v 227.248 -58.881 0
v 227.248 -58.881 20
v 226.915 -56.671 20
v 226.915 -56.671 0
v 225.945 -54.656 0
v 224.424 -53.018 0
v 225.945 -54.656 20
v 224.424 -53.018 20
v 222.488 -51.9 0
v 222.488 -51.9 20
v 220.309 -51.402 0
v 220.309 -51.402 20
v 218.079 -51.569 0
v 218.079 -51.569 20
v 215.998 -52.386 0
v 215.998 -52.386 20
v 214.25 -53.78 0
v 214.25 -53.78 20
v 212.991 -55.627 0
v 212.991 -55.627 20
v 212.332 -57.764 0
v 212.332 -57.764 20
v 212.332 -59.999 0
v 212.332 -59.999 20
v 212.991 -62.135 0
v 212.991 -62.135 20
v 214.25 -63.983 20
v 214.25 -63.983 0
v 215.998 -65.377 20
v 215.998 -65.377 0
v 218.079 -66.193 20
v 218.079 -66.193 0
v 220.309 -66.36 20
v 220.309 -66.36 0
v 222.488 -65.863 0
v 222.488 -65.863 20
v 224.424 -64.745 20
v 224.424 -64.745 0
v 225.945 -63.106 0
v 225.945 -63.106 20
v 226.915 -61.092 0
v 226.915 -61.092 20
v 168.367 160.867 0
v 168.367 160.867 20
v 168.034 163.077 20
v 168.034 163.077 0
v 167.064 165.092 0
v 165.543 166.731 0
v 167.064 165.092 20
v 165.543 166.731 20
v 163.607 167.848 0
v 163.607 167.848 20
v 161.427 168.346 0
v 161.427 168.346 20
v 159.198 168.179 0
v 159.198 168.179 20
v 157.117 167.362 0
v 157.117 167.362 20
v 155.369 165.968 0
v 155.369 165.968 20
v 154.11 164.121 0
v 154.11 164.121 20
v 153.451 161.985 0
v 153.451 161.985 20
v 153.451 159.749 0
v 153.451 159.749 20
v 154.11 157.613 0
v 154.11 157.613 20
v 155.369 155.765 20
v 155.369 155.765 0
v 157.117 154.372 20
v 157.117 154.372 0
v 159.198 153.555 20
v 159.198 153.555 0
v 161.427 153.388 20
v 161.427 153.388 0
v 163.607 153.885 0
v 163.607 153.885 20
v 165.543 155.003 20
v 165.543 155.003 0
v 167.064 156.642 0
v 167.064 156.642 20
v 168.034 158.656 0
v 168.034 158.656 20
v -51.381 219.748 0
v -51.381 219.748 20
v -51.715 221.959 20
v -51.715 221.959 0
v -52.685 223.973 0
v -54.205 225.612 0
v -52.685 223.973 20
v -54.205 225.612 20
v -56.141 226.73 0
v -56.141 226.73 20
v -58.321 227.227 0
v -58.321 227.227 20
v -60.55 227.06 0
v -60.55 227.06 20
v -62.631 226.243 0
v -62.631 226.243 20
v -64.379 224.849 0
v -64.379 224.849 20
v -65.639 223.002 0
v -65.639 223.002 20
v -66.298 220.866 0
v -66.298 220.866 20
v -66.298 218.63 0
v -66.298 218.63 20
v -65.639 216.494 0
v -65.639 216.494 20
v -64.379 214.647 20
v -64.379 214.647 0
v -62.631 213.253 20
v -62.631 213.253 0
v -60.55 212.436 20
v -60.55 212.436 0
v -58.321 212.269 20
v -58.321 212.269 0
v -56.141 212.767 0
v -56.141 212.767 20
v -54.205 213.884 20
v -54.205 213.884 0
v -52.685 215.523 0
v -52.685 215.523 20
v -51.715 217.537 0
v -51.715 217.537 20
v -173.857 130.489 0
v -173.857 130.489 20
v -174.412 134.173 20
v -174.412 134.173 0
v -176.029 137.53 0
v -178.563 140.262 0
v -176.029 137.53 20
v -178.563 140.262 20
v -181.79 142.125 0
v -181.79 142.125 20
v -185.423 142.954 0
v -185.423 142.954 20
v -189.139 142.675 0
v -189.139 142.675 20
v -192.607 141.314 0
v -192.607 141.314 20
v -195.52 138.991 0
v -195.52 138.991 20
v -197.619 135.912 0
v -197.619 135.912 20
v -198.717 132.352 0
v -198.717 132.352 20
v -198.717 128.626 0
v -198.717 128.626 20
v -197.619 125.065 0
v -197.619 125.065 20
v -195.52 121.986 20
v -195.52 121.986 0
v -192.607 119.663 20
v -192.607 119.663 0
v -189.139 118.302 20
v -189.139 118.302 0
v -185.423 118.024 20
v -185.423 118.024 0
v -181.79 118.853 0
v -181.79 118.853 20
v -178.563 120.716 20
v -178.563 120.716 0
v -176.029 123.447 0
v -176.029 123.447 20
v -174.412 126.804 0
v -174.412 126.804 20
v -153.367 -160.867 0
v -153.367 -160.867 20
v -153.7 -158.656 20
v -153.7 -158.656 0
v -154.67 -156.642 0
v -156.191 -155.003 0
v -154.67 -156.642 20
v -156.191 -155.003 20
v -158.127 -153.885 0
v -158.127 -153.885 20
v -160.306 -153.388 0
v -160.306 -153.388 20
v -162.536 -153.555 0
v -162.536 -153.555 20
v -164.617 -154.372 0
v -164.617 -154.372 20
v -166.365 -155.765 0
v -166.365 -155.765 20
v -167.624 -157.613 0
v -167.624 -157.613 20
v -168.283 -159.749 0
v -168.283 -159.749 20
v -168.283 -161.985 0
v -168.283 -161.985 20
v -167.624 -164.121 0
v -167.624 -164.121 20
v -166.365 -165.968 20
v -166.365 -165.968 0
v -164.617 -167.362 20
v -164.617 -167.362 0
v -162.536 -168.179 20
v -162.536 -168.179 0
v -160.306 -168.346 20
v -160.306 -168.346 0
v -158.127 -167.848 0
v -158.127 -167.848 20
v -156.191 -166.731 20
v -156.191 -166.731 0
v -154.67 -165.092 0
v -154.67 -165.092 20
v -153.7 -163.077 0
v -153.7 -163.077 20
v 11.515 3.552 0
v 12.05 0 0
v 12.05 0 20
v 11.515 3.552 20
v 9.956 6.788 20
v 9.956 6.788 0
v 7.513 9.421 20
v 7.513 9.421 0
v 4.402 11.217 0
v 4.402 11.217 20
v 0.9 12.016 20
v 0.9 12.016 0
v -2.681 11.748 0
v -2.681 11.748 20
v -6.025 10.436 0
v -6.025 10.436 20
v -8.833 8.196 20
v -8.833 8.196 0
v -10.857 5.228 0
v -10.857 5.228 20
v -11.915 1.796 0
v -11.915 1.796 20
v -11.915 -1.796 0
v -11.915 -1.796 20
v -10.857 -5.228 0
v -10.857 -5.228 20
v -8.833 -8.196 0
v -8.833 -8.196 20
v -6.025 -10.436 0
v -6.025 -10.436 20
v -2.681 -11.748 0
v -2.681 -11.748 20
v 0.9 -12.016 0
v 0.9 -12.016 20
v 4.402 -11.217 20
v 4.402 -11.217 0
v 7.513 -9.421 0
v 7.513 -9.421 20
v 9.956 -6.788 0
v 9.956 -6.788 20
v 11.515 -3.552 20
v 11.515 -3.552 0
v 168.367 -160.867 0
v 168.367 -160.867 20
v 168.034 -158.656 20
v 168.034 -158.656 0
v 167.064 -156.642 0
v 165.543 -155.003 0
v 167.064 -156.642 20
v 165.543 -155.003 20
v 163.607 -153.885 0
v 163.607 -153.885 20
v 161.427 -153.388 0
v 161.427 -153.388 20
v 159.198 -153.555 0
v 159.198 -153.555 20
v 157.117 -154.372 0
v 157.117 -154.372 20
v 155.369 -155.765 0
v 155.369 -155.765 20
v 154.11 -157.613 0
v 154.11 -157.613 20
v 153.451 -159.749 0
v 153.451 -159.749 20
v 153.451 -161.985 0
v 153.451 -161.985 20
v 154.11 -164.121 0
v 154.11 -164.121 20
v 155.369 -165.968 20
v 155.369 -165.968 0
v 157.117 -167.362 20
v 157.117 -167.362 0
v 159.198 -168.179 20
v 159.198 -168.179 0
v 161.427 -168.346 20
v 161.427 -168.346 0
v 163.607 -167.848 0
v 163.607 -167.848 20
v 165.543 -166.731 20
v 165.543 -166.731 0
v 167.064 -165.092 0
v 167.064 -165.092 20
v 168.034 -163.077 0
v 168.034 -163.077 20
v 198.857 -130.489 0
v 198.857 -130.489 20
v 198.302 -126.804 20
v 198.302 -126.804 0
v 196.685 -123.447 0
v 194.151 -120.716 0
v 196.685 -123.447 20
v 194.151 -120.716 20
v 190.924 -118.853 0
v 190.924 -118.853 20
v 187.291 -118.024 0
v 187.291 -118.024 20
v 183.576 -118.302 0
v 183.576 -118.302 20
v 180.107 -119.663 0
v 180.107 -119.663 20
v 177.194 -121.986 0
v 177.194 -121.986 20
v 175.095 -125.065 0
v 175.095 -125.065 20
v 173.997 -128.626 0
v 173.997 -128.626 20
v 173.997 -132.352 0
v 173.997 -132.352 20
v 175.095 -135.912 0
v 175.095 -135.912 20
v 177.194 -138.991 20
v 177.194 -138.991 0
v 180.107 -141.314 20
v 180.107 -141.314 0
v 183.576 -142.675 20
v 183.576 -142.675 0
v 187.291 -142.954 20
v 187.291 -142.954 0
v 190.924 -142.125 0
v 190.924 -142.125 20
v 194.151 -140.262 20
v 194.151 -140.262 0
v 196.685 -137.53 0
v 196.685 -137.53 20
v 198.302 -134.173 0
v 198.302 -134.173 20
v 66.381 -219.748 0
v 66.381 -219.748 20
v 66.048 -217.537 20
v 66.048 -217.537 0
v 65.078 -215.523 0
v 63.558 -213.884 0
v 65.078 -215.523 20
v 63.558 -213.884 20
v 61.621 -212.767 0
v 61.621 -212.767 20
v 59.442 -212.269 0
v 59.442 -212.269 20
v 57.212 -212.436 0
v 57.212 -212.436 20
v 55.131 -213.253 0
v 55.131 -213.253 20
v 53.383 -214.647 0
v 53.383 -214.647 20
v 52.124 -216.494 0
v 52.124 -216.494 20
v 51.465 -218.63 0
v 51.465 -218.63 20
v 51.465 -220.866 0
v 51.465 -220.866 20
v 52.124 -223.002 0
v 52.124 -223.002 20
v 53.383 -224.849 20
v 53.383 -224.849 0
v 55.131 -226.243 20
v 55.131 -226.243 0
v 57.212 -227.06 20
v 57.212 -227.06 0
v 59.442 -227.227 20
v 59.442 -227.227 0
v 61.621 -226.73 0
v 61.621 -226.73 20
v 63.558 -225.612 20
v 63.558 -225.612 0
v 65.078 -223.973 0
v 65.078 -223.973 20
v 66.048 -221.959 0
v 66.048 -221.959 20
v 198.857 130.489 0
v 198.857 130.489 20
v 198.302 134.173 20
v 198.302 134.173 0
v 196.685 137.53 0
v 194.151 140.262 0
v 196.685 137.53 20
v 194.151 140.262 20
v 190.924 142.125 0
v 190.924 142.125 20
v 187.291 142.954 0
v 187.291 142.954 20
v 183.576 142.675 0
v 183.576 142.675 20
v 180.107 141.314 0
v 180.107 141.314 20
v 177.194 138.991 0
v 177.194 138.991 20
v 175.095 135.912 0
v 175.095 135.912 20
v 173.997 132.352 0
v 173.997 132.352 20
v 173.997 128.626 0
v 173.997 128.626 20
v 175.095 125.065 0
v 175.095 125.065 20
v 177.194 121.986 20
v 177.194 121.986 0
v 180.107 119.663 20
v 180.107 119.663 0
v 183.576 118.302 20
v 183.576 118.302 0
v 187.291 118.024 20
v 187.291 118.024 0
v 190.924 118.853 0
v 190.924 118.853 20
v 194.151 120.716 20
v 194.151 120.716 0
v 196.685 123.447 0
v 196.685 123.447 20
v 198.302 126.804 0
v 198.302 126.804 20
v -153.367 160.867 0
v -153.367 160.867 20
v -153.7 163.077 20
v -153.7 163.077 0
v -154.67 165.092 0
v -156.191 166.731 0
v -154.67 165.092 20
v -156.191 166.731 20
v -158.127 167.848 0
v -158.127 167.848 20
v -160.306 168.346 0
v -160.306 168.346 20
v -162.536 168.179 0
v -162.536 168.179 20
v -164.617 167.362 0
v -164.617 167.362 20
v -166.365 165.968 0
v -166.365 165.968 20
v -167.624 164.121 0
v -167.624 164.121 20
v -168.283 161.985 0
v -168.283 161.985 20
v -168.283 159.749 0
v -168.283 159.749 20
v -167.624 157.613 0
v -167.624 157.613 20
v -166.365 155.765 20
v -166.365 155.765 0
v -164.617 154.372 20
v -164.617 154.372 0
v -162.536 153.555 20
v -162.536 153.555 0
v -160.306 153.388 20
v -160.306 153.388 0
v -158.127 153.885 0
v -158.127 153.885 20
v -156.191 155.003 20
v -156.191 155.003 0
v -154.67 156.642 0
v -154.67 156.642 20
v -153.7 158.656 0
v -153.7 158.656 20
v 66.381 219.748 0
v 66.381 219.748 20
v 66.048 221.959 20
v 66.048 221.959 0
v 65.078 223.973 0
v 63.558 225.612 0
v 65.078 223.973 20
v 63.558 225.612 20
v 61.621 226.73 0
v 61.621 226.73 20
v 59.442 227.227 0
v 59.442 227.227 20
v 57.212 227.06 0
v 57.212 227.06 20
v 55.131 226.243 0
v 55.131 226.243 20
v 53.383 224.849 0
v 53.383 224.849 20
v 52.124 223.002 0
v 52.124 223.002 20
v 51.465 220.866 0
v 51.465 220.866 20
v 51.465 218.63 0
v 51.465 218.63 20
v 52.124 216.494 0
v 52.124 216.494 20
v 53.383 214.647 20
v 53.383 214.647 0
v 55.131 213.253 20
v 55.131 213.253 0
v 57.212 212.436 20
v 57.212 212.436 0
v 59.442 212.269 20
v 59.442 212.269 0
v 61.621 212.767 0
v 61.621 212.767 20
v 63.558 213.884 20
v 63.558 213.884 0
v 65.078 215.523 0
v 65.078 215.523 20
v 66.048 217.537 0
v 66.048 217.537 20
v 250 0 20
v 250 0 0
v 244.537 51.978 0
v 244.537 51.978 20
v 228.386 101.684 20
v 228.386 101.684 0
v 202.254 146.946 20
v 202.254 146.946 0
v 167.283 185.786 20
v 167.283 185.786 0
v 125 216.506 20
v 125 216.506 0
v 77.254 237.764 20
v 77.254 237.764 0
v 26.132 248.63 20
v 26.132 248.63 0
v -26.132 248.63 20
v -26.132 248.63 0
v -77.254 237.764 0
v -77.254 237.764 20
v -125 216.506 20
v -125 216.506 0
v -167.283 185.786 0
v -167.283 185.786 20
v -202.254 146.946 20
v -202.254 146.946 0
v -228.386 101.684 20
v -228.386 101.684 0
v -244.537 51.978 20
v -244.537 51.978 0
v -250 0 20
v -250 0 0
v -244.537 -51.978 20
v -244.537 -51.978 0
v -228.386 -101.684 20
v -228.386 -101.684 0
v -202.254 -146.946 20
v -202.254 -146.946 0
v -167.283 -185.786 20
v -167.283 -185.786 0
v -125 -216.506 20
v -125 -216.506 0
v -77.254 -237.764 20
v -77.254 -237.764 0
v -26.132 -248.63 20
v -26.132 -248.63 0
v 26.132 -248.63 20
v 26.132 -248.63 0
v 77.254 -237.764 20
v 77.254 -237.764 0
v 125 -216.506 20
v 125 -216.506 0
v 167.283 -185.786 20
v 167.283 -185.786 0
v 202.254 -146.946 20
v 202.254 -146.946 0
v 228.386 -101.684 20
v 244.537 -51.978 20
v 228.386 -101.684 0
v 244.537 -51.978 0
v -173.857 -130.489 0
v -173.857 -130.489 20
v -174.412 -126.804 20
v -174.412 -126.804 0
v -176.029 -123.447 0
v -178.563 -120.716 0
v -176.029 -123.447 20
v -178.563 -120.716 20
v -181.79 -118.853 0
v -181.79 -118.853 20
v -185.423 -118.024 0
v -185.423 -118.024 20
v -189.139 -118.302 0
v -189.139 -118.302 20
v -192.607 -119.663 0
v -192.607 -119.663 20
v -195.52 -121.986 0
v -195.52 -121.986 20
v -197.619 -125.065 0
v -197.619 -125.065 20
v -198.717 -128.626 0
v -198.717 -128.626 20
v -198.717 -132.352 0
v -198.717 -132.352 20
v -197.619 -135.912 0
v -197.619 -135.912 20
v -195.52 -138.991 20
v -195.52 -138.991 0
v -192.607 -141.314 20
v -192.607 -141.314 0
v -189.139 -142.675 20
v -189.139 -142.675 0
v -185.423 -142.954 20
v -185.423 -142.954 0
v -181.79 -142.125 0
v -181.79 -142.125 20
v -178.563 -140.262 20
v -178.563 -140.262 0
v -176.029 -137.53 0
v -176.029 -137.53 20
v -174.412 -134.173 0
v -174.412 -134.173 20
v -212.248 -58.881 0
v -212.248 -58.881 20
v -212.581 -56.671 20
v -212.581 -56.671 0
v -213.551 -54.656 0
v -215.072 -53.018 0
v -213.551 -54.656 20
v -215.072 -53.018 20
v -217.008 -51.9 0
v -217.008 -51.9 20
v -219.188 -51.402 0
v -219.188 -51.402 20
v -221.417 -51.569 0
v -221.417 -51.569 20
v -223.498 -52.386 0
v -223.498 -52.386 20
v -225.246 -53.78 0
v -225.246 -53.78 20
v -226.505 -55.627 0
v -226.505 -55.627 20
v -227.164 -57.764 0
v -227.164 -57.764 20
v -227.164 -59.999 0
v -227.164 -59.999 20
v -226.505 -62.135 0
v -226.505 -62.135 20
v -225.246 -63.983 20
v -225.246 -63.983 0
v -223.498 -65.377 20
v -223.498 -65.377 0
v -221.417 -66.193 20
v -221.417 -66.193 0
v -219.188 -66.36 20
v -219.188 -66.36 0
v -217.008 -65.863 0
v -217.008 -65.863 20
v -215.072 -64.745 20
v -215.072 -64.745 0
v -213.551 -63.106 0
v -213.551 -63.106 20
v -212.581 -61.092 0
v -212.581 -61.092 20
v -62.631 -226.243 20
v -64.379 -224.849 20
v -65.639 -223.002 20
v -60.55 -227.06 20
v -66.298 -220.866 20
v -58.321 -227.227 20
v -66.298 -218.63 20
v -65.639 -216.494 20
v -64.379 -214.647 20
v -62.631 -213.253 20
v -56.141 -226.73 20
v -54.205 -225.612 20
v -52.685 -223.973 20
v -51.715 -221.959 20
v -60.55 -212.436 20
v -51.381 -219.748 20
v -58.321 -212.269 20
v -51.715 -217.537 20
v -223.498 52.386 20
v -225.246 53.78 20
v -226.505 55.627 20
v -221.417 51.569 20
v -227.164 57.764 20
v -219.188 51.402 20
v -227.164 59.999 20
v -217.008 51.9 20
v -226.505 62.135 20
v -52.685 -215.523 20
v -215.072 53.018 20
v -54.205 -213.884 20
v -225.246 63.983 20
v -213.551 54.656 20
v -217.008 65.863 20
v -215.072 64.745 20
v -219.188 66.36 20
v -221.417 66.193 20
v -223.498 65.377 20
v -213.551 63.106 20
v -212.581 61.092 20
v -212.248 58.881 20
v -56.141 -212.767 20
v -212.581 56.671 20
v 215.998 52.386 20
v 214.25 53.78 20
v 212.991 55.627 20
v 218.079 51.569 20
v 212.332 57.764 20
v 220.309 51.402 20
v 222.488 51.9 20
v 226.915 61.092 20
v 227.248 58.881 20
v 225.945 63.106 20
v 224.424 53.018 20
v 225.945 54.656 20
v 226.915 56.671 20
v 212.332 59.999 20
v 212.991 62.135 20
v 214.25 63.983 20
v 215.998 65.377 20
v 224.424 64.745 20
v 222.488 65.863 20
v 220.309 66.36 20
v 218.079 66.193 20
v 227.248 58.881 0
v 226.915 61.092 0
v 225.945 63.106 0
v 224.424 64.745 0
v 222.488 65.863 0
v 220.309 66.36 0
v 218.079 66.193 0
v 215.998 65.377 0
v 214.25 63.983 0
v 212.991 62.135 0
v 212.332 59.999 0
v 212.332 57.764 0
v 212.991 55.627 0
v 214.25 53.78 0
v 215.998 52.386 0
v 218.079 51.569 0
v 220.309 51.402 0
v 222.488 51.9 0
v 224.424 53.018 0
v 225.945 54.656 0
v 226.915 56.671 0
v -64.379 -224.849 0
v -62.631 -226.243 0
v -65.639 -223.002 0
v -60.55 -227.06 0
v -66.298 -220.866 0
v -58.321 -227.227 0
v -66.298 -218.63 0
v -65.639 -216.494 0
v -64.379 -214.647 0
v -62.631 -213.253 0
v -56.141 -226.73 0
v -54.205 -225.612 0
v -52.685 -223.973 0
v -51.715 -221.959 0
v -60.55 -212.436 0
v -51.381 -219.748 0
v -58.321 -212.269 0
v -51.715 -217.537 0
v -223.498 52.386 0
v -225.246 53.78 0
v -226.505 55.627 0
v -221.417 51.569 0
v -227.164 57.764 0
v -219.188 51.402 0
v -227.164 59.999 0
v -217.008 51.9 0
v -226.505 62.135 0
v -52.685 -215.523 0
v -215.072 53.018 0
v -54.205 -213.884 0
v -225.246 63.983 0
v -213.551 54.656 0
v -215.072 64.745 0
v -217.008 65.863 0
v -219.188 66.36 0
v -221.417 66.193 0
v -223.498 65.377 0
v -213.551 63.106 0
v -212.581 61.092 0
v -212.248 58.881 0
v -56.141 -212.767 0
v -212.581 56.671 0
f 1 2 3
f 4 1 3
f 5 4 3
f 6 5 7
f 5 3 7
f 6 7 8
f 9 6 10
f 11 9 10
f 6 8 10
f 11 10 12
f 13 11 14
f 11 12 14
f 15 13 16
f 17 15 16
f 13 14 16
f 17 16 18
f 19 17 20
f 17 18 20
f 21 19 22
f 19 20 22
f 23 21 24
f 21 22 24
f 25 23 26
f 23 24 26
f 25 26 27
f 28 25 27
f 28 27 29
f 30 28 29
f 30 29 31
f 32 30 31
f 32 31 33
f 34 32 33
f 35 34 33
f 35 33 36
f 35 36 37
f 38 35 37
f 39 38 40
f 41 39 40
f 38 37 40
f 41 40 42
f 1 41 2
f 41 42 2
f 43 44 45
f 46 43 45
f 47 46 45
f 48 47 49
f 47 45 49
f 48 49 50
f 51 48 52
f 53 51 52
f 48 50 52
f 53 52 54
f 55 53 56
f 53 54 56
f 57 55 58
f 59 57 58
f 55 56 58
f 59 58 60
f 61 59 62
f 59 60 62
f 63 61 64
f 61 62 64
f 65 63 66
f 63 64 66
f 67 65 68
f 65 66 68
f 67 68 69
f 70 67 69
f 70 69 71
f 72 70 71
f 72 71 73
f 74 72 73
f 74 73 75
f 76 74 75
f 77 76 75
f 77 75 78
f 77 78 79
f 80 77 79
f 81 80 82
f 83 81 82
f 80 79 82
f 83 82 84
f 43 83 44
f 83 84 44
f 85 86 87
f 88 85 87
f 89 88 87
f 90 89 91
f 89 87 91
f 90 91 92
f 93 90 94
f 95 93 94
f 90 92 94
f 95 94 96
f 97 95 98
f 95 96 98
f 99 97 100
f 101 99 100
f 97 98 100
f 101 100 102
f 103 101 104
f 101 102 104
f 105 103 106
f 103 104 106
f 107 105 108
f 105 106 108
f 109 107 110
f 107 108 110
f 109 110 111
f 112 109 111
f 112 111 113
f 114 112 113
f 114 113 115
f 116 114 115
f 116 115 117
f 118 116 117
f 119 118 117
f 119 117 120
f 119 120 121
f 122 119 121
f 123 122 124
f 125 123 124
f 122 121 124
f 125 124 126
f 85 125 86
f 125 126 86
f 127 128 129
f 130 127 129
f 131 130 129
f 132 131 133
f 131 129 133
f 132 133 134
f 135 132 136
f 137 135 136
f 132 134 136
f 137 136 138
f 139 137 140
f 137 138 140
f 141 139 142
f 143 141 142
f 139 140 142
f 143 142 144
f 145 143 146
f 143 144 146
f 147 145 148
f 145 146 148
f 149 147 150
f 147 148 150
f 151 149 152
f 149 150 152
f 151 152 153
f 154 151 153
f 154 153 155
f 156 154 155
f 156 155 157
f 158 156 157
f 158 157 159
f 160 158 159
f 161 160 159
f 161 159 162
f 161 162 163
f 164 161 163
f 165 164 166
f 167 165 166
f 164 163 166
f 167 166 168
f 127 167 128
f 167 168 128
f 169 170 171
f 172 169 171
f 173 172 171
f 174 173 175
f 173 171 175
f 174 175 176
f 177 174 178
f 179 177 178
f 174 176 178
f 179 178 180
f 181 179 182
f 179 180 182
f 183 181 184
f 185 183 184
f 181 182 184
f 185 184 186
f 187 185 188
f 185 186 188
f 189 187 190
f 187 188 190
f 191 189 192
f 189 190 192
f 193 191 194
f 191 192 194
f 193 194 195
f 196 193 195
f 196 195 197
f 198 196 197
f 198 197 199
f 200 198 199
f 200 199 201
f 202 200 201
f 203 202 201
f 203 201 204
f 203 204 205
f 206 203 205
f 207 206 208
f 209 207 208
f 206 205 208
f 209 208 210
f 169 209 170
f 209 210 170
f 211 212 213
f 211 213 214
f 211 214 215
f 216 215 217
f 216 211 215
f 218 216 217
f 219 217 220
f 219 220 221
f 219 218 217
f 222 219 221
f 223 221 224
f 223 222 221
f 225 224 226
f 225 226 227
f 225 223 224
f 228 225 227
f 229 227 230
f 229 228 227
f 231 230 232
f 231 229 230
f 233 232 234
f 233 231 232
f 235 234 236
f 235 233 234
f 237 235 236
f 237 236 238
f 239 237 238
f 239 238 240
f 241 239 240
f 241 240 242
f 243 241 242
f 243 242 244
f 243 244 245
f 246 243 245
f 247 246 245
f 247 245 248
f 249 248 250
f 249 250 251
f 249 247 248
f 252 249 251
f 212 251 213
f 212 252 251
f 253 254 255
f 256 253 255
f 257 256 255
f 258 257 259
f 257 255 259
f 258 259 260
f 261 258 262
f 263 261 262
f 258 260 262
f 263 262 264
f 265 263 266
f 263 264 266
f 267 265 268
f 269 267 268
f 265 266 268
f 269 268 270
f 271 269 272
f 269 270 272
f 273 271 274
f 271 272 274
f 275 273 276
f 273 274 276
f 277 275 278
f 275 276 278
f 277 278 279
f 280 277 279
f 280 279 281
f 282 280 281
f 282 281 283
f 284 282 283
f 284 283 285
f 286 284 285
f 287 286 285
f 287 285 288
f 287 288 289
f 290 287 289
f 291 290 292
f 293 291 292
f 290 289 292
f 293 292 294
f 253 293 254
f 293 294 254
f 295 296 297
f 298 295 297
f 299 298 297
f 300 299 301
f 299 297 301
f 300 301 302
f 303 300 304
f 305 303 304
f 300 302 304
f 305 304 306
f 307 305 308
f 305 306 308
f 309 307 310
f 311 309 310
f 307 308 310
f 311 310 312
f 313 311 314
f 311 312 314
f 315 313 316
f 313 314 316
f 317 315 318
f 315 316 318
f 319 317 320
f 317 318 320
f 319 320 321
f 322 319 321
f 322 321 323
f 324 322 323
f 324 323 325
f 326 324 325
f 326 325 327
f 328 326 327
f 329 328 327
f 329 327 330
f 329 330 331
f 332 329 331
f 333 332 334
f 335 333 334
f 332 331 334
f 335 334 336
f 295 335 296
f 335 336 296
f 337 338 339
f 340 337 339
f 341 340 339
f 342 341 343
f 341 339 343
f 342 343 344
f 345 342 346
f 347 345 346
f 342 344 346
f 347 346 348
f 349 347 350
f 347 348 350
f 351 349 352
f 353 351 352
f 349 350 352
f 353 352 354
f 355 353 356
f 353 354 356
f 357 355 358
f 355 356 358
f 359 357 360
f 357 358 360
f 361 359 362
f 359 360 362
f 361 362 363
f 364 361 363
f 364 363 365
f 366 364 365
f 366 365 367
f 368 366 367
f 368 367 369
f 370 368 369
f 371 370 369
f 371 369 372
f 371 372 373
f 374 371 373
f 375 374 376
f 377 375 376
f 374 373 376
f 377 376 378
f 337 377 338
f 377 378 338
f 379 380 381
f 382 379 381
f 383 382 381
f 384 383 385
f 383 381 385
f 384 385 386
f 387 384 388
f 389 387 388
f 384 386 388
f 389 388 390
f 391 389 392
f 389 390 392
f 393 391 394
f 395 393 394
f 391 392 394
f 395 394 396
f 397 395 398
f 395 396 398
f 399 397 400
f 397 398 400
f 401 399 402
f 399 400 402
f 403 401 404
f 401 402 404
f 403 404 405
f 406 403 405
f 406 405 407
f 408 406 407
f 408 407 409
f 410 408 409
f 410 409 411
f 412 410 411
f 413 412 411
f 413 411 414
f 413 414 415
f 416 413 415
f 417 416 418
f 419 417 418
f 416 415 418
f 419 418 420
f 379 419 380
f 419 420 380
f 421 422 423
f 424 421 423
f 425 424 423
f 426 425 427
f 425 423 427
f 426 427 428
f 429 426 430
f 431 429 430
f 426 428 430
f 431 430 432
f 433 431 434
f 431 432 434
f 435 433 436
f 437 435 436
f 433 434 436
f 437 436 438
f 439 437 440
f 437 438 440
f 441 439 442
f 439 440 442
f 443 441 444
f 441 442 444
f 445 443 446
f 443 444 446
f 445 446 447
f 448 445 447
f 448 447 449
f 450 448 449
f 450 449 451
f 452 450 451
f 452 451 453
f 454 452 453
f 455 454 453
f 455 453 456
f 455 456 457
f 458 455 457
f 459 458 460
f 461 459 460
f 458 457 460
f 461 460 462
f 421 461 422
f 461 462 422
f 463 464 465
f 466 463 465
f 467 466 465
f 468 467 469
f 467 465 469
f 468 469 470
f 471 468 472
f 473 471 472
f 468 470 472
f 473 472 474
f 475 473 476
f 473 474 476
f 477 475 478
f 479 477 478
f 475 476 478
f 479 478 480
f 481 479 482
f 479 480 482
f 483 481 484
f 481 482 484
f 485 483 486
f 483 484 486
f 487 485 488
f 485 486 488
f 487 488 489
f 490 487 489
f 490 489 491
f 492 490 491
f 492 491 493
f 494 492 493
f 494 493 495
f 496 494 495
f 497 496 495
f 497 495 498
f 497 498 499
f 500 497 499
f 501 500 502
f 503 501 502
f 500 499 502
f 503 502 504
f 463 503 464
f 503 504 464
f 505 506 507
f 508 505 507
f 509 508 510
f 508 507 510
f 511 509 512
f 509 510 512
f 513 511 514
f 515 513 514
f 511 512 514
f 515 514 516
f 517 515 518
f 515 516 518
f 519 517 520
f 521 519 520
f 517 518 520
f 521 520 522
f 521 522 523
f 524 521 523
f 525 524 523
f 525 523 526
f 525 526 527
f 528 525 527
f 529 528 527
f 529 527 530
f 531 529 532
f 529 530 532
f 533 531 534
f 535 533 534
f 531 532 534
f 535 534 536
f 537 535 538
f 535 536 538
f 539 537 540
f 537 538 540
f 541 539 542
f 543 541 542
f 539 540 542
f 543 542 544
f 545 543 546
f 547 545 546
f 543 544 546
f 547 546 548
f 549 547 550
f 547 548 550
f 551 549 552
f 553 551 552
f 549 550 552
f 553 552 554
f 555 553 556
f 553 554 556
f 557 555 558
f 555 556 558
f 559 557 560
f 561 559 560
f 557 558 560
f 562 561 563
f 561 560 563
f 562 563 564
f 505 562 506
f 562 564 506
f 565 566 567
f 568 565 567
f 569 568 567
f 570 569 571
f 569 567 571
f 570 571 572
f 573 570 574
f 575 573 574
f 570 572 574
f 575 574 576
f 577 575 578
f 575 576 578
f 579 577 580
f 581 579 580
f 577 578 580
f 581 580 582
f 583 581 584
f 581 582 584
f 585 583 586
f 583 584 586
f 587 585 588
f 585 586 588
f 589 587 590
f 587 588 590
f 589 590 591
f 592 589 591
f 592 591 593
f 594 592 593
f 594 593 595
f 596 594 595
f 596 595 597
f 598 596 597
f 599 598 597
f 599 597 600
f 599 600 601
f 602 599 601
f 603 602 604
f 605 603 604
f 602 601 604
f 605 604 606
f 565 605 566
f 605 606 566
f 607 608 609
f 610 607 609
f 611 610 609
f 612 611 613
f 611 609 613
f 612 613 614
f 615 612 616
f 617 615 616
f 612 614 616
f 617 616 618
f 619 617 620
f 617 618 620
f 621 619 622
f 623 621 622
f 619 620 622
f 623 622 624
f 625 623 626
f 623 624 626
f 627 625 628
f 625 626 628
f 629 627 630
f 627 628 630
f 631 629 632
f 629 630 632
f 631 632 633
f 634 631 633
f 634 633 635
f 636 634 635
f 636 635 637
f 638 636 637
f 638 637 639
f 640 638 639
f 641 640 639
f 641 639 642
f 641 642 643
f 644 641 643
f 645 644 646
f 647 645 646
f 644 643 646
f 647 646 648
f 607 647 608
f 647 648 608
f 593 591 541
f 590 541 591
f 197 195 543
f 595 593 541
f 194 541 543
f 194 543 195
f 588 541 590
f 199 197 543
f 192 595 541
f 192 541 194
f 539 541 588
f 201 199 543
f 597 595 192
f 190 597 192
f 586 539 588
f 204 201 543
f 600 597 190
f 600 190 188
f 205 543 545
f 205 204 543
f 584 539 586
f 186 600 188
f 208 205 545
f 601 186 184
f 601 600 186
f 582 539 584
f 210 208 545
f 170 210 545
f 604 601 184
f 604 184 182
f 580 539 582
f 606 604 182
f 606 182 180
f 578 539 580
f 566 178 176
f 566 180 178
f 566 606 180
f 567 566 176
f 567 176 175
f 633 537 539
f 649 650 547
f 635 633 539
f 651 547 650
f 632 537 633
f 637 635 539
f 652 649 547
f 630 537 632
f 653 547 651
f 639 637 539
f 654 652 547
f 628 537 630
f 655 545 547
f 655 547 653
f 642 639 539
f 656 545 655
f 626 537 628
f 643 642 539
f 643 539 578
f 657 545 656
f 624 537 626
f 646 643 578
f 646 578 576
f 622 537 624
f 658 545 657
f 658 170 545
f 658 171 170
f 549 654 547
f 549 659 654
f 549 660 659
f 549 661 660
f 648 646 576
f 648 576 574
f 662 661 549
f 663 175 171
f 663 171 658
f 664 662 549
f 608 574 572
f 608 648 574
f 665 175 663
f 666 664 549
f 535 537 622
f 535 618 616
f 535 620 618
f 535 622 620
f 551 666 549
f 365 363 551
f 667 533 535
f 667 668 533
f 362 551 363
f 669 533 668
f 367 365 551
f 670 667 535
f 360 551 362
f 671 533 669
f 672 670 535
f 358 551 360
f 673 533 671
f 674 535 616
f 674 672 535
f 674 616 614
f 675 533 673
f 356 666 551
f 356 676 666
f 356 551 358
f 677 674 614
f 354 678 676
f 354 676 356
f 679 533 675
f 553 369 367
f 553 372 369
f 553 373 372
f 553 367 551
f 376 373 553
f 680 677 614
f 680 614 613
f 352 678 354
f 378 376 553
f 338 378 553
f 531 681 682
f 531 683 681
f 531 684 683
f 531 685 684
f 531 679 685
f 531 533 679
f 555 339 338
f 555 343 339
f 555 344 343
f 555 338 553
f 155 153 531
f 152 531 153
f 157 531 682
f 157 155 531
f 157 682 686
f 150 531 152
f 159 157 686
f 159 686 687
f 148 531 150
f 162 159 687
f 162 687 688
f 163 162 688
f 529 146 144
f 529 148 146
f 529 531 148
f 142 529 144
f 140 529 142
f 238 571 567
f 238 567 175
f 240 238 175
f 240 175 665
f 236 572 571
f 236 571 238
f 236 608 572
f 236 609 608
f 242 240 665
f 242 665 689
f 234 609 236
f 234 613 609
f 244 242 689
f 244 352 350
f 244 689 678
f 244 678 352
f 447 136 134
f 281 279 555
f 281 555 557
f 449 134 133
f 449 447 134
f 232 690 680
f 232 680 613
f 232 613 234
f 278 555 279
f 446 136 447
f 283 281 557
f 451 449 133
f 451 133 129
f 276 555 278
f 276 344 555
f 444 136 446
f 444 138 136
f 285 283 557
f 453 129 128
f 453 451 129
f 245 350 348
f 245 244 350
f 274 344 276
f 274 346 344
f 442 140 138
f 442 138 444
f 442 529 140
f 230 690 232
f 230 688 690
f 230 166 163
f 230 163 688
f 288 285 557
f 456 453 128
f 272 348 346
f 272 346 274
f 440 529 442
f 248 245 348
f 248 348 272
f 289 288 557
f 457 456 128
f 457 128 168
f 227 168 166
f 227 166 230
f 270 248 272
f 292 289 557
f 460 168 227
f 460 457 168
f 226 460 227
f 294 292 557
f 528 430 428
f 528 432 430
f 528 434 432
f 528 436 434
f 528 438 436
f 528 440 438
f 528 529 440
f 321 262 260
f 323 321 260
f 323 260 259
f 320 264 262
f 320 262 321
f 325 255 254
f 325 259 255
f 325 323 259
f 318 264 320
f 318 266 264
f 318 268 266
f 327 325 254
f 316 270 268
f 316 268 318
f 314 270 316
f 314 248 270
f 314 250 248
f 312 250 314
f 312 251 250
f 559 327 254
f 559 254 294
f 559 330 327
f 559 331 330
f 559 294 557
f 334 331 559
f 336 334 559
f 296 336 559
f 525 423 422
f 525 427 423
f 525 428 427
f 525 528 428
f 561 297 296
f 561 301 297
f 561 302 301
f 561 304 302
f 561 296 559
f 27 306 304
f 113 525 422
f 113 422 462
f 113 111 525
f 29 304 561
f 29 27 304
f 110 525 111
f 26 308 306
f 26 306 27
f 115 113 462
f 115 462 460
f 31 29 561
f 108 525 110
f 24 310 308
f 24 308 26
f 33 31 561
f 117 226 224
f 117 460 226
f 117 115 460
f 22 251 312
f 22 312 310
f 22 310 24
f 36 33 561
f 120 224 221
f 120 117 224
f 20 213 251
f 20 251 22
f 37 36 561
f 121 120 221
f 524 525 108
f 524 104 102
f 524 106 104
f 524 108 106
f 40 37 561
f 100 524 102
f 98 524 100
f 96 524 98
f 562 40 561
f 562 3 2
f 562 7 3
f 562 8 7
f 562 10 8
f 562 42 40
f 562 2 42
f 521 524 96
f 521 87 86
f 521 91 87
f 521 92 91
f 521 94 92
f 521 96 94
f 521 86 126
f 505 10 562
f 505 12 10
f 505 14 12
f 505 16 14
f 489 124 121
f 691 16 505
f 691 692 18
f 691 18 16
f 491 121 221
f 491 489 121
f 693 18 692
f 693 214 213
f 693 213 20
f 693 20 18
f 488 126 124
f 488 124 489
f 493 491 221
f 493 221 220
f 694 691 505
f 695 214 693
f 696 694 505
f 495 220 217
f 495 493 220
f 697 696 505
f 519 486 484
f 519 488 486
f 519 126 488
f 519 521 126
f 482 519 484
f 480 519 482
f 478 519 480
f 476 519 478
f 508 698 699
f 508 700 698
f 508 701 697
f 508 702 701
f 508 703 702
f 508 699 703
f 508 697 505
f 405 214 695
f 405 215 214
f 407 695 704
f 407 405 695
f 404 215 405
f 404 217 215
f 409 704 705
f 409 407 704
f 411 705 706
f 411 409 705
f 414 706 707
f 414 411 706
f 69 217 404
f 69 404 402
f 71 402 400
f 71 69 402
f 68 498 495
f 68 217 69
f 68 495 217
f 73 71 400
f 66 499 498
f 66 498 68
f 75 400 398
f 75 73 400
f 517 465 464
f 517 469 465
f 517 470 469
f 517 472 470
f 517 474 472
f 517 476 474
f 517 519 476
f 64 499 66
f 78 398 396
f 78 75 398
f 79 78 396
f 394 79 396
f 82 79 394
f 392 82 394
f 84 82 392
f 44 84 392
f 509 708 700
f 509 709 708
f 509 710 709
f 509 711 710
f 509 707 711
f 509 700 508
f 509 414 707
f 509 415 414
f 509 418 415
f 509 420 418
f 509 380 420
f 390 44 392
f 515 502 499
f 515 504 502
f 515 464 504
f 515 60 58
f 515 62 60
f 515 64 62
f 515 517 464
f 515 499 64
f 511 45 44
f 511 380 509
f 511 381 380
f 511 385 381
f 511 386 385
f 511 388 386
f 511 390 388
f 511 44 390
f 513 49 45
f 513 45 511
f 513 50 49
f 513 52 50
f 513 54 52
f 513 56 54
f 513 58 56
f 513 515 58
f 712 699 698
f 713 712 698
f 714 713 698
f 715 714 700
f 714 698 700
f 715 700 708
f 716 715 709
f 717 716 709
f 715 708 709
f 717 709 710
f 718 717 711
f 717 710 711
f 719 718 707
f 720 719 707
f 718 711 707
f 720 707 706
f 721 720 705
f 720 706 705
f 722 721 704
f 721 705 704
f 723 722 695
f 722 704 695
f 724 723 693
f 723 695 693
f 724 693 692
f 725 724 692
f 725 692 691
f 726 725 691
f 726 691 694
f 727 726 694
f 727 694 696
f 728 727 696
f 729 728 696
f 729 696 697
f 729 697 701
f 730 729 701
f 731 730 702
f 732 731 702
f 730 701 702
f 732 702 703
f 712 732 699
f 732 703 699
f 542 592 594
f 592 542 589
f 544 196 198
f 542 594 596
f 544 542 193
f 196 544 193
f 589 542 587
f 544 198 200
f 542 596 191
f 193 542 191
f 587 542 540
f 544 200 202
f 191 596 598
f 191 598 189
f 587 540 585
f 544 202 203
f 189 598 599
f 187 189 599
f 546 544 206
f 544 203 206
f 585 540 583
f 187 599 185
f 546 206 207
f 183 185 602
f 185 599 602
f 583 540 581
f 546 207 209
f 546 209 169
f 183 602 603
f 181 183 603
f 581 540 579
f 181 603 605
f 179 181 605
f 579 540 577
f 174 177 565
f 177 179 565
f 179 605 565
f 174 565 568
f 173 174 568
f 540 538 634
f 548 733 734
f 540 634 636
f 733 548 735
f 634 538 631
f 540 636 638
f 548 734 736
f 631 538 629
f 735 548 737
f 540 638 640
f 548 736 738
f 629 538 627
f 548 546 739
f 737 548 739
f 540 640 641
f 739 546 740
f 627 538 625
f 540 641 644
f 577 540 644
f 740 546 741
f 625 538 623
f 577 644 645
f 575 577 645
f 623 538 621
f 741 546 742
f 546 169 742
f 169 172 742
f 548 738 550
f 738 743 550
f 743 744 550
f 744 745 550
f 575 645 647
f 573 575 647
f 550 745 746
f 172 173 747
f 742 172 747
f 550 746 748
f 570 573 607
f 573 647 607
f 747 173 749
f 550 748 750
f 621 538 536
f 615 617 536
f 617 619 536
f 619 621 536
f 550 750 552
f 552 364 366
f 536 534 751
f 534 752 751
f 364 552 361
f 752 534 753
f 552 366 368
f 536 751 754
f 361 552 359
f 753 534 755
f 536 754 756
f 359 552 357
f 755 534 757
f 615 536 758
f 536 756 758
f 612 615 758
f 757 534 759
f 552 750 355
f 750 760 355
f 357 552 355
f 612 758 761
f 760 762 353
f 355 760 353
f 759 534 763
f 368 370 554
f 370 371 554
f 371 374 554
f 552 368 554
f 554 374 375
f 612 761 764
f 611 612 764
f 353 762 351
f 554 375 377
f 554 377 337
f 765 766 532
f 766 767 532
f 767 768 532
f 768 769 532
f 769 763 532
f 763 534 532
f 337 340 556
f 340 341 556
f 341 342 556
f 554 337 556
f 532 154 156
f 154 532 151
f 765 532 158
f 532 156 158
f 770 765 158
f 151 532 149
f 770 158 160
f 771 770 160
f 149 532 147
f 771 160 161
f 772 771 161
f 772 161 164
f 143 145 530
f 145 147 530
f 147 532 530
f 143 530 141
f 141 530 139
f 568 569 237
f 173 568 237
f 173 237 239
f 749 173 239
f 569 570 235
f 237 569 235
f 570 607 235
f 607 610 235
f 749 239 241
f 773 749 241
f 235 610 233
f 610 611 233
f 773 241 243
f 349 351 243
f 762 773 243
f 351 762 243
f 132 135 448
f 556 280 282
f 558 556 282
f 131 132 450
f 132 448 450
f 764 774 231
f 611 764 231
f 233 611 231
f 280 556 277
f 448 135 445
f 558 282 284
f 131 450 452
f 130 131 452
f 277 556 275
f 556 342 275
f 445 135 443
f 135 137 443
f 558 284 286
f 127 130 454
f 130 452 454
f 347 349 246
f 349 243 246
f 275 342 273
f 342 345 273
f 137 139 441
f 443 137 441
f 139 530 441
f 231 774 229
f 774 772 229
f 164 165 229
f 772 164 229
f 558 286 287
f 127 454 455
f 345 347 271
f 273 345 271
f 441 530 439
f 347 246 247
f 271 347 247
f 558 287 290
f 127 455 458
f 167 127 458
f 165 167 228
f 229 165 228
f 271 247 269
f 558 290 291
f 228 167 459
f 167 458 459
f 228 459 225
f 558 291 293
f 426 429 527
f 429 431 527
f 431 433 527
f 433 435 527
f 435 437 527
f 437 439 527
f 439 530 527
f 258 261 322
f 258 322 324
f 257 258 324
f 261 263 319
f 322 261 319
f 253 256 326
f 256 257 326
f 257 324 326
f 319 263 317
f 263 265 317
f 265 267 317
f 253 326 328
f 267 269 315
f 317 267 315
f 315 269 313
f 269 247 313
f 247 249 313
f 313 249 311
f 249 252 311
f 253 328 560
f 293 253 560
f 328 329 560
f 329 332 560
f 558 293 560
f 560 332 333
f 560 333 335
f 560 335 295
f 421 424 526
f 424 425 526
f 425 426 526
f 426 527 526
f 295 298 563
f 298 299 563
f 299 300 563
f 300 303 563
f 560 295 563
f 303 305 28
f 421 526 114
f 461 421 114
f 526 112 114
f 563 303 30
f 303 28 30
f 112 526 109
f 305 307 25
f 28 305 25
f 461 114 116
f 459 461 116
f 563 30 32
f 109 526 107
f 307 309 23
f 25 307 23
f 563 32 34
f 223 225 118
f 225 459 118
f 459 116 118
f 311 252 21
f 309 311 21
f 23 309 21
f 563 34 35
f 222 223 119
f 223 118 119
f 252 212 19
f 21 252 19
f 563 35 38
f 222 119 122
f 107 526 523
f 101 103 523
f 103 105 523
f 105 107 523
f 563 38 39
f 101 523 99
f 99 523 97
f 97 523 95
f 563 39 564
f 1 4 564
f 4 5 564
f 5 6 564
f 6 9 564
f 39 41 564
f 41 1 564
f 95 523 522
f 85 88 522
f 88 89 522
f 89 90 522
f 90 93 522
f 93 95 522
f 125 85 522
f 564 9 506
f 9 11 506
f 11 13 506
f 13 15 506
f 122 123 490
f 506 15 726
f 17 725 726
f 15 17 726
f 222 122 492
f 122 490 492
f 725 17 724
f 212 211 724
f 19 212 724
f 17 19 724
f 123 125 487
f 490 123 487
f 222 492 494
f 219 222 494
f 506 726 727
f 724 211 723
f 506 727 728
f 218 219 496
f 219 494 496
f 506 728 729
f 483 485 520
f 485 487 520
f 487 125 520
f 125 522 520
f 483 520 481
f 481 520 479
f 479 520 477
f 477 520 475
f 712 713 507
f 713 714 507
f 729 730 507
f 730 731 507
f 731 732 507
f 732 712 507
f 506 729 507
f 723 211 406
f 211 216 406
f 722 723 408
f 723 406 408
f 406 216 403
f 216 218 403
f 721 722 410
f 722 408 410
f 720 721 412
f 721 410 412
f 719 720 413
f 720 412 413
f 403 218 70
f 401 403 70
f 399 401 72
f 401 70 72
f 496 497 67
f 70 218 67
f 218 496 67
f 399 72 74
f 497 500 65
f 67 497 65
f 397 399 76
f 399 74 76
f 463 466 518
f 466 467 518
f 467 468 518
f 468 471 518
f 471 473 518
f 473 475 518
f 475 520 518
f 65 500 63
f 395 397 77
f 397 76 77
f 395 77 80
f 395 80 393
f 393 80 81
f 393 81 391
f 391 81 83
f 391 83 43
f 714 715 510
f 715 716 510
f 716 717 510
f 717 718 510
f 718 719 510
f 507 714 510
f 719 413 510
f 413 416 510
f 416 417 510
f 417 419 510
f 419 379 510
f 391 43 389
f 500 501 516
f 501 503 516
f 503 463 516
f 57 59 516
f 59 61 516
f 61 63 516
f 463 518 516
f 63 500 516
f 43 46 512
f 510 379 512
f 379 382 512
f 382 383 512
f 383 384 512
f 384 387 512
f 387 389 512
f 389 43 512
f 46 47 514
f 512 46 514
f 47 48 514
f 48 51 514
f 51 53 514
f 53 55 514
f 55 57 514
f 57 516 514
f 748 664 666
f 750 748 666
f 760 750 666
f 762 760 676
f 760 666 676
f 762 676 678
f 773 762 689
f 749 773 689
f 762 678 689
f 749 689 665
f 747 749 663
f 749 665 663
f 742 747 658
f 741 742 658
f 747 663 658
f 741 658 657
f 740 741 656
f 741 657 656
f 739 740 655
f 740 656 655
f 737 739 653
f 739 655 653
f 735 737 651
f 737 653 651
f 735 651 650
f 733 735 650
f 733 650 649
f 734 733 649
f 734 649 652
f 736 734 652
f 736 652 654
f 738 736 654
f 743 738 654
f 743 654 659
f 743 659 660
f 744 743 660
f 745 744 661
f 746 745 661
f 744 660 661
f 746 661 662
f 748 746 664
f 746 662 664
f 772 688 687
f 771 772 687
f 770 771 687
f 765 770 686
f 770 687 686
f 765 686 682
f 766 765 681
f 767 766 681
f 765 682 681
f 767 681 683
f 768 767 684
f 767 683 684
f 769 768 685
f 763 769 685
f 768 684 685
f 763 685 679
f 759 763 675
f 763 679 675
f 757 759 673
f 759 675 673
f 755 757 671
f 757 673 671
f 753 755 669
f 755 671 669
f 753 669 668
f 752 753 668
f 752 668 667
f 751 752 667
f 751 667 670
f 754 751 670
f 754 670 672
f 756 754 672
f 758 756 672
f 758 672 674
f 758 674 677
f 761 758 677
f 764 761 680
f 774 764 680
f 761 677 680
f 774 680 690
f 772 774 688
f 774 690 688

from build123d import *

# Parameters (mm, degrees)
F0_R     = 250
F0_R_2   = 12.05
F1_DEPTH = 20
F2_R     = 7.5
F3_DEPTH = 20
F4_R     = 12.5
F5_DEPTH = 20


with BuildPart() as f1:
    # F0 (on Top) → F1 (new body)
    with BuildSketch(Plane.XY):
        Circle(F0_R)
        Circle(F0_R_2, mode=Mode.SUBTRACT)
    extrude(amount=F1_DEPTH)

    # F2 (on face) → F3 (cut, through all)
    with BuildSketch(Plane.XY.offset(20)):
        with Locations((219.748125, 58.881333)):
            Circle(F2_R)
        with Locations((160.866793, 160.866793)):
            Circle(F2_R)
        with Locations((58.881333, 219.748125)):
            Circle(F2_R)
        with Locations((-58.881333, 219.748125)):
            Circle(F2_R)
        with Locations((-160.866793, 160.866793)):
            Circle(F2_R)
        with Locations((-219.748125, 58.881333)):
            Circle(F2_R)
        with Locations((-219.748125, -58.881333)):
            Circle(F2_R)
        with Locations((-160.866793, -160.866793)):
            Circle(F2_R)
        with Locations((-58.881333, -219.748125)):
            Circle(F2_R)
        with Locations((58.881333, -219.748125)):
            Circle(F2_R)
        with Locations((160.866793, -160.866793)):
            Circle(F2_R)
        with Locations((219.748125, -58.881333)):
            Circle(F2_R)
    extrude(amount=-F3_DEPTH, mode=Mode.SUBTRACT)

    # F4 (on face) → F5 (cut)
    with BuildSketch(Plane.XY.offset(20)):
        with Locations((186.35709, 130.488639)):
            Circle(F4_R)
        with Locations((-186.35709, 130.488639)):
            Circle(F4_R)
        with Locations((-186.35709, -130.488639)):
            Circle(F4_R)
        with Locations((186.35709, -130.488639)):
            Circle(F4_R)
    extrude(amount=-F5_DEPTH, mode=Mode.SUBTRACT)


solid = f1.part
